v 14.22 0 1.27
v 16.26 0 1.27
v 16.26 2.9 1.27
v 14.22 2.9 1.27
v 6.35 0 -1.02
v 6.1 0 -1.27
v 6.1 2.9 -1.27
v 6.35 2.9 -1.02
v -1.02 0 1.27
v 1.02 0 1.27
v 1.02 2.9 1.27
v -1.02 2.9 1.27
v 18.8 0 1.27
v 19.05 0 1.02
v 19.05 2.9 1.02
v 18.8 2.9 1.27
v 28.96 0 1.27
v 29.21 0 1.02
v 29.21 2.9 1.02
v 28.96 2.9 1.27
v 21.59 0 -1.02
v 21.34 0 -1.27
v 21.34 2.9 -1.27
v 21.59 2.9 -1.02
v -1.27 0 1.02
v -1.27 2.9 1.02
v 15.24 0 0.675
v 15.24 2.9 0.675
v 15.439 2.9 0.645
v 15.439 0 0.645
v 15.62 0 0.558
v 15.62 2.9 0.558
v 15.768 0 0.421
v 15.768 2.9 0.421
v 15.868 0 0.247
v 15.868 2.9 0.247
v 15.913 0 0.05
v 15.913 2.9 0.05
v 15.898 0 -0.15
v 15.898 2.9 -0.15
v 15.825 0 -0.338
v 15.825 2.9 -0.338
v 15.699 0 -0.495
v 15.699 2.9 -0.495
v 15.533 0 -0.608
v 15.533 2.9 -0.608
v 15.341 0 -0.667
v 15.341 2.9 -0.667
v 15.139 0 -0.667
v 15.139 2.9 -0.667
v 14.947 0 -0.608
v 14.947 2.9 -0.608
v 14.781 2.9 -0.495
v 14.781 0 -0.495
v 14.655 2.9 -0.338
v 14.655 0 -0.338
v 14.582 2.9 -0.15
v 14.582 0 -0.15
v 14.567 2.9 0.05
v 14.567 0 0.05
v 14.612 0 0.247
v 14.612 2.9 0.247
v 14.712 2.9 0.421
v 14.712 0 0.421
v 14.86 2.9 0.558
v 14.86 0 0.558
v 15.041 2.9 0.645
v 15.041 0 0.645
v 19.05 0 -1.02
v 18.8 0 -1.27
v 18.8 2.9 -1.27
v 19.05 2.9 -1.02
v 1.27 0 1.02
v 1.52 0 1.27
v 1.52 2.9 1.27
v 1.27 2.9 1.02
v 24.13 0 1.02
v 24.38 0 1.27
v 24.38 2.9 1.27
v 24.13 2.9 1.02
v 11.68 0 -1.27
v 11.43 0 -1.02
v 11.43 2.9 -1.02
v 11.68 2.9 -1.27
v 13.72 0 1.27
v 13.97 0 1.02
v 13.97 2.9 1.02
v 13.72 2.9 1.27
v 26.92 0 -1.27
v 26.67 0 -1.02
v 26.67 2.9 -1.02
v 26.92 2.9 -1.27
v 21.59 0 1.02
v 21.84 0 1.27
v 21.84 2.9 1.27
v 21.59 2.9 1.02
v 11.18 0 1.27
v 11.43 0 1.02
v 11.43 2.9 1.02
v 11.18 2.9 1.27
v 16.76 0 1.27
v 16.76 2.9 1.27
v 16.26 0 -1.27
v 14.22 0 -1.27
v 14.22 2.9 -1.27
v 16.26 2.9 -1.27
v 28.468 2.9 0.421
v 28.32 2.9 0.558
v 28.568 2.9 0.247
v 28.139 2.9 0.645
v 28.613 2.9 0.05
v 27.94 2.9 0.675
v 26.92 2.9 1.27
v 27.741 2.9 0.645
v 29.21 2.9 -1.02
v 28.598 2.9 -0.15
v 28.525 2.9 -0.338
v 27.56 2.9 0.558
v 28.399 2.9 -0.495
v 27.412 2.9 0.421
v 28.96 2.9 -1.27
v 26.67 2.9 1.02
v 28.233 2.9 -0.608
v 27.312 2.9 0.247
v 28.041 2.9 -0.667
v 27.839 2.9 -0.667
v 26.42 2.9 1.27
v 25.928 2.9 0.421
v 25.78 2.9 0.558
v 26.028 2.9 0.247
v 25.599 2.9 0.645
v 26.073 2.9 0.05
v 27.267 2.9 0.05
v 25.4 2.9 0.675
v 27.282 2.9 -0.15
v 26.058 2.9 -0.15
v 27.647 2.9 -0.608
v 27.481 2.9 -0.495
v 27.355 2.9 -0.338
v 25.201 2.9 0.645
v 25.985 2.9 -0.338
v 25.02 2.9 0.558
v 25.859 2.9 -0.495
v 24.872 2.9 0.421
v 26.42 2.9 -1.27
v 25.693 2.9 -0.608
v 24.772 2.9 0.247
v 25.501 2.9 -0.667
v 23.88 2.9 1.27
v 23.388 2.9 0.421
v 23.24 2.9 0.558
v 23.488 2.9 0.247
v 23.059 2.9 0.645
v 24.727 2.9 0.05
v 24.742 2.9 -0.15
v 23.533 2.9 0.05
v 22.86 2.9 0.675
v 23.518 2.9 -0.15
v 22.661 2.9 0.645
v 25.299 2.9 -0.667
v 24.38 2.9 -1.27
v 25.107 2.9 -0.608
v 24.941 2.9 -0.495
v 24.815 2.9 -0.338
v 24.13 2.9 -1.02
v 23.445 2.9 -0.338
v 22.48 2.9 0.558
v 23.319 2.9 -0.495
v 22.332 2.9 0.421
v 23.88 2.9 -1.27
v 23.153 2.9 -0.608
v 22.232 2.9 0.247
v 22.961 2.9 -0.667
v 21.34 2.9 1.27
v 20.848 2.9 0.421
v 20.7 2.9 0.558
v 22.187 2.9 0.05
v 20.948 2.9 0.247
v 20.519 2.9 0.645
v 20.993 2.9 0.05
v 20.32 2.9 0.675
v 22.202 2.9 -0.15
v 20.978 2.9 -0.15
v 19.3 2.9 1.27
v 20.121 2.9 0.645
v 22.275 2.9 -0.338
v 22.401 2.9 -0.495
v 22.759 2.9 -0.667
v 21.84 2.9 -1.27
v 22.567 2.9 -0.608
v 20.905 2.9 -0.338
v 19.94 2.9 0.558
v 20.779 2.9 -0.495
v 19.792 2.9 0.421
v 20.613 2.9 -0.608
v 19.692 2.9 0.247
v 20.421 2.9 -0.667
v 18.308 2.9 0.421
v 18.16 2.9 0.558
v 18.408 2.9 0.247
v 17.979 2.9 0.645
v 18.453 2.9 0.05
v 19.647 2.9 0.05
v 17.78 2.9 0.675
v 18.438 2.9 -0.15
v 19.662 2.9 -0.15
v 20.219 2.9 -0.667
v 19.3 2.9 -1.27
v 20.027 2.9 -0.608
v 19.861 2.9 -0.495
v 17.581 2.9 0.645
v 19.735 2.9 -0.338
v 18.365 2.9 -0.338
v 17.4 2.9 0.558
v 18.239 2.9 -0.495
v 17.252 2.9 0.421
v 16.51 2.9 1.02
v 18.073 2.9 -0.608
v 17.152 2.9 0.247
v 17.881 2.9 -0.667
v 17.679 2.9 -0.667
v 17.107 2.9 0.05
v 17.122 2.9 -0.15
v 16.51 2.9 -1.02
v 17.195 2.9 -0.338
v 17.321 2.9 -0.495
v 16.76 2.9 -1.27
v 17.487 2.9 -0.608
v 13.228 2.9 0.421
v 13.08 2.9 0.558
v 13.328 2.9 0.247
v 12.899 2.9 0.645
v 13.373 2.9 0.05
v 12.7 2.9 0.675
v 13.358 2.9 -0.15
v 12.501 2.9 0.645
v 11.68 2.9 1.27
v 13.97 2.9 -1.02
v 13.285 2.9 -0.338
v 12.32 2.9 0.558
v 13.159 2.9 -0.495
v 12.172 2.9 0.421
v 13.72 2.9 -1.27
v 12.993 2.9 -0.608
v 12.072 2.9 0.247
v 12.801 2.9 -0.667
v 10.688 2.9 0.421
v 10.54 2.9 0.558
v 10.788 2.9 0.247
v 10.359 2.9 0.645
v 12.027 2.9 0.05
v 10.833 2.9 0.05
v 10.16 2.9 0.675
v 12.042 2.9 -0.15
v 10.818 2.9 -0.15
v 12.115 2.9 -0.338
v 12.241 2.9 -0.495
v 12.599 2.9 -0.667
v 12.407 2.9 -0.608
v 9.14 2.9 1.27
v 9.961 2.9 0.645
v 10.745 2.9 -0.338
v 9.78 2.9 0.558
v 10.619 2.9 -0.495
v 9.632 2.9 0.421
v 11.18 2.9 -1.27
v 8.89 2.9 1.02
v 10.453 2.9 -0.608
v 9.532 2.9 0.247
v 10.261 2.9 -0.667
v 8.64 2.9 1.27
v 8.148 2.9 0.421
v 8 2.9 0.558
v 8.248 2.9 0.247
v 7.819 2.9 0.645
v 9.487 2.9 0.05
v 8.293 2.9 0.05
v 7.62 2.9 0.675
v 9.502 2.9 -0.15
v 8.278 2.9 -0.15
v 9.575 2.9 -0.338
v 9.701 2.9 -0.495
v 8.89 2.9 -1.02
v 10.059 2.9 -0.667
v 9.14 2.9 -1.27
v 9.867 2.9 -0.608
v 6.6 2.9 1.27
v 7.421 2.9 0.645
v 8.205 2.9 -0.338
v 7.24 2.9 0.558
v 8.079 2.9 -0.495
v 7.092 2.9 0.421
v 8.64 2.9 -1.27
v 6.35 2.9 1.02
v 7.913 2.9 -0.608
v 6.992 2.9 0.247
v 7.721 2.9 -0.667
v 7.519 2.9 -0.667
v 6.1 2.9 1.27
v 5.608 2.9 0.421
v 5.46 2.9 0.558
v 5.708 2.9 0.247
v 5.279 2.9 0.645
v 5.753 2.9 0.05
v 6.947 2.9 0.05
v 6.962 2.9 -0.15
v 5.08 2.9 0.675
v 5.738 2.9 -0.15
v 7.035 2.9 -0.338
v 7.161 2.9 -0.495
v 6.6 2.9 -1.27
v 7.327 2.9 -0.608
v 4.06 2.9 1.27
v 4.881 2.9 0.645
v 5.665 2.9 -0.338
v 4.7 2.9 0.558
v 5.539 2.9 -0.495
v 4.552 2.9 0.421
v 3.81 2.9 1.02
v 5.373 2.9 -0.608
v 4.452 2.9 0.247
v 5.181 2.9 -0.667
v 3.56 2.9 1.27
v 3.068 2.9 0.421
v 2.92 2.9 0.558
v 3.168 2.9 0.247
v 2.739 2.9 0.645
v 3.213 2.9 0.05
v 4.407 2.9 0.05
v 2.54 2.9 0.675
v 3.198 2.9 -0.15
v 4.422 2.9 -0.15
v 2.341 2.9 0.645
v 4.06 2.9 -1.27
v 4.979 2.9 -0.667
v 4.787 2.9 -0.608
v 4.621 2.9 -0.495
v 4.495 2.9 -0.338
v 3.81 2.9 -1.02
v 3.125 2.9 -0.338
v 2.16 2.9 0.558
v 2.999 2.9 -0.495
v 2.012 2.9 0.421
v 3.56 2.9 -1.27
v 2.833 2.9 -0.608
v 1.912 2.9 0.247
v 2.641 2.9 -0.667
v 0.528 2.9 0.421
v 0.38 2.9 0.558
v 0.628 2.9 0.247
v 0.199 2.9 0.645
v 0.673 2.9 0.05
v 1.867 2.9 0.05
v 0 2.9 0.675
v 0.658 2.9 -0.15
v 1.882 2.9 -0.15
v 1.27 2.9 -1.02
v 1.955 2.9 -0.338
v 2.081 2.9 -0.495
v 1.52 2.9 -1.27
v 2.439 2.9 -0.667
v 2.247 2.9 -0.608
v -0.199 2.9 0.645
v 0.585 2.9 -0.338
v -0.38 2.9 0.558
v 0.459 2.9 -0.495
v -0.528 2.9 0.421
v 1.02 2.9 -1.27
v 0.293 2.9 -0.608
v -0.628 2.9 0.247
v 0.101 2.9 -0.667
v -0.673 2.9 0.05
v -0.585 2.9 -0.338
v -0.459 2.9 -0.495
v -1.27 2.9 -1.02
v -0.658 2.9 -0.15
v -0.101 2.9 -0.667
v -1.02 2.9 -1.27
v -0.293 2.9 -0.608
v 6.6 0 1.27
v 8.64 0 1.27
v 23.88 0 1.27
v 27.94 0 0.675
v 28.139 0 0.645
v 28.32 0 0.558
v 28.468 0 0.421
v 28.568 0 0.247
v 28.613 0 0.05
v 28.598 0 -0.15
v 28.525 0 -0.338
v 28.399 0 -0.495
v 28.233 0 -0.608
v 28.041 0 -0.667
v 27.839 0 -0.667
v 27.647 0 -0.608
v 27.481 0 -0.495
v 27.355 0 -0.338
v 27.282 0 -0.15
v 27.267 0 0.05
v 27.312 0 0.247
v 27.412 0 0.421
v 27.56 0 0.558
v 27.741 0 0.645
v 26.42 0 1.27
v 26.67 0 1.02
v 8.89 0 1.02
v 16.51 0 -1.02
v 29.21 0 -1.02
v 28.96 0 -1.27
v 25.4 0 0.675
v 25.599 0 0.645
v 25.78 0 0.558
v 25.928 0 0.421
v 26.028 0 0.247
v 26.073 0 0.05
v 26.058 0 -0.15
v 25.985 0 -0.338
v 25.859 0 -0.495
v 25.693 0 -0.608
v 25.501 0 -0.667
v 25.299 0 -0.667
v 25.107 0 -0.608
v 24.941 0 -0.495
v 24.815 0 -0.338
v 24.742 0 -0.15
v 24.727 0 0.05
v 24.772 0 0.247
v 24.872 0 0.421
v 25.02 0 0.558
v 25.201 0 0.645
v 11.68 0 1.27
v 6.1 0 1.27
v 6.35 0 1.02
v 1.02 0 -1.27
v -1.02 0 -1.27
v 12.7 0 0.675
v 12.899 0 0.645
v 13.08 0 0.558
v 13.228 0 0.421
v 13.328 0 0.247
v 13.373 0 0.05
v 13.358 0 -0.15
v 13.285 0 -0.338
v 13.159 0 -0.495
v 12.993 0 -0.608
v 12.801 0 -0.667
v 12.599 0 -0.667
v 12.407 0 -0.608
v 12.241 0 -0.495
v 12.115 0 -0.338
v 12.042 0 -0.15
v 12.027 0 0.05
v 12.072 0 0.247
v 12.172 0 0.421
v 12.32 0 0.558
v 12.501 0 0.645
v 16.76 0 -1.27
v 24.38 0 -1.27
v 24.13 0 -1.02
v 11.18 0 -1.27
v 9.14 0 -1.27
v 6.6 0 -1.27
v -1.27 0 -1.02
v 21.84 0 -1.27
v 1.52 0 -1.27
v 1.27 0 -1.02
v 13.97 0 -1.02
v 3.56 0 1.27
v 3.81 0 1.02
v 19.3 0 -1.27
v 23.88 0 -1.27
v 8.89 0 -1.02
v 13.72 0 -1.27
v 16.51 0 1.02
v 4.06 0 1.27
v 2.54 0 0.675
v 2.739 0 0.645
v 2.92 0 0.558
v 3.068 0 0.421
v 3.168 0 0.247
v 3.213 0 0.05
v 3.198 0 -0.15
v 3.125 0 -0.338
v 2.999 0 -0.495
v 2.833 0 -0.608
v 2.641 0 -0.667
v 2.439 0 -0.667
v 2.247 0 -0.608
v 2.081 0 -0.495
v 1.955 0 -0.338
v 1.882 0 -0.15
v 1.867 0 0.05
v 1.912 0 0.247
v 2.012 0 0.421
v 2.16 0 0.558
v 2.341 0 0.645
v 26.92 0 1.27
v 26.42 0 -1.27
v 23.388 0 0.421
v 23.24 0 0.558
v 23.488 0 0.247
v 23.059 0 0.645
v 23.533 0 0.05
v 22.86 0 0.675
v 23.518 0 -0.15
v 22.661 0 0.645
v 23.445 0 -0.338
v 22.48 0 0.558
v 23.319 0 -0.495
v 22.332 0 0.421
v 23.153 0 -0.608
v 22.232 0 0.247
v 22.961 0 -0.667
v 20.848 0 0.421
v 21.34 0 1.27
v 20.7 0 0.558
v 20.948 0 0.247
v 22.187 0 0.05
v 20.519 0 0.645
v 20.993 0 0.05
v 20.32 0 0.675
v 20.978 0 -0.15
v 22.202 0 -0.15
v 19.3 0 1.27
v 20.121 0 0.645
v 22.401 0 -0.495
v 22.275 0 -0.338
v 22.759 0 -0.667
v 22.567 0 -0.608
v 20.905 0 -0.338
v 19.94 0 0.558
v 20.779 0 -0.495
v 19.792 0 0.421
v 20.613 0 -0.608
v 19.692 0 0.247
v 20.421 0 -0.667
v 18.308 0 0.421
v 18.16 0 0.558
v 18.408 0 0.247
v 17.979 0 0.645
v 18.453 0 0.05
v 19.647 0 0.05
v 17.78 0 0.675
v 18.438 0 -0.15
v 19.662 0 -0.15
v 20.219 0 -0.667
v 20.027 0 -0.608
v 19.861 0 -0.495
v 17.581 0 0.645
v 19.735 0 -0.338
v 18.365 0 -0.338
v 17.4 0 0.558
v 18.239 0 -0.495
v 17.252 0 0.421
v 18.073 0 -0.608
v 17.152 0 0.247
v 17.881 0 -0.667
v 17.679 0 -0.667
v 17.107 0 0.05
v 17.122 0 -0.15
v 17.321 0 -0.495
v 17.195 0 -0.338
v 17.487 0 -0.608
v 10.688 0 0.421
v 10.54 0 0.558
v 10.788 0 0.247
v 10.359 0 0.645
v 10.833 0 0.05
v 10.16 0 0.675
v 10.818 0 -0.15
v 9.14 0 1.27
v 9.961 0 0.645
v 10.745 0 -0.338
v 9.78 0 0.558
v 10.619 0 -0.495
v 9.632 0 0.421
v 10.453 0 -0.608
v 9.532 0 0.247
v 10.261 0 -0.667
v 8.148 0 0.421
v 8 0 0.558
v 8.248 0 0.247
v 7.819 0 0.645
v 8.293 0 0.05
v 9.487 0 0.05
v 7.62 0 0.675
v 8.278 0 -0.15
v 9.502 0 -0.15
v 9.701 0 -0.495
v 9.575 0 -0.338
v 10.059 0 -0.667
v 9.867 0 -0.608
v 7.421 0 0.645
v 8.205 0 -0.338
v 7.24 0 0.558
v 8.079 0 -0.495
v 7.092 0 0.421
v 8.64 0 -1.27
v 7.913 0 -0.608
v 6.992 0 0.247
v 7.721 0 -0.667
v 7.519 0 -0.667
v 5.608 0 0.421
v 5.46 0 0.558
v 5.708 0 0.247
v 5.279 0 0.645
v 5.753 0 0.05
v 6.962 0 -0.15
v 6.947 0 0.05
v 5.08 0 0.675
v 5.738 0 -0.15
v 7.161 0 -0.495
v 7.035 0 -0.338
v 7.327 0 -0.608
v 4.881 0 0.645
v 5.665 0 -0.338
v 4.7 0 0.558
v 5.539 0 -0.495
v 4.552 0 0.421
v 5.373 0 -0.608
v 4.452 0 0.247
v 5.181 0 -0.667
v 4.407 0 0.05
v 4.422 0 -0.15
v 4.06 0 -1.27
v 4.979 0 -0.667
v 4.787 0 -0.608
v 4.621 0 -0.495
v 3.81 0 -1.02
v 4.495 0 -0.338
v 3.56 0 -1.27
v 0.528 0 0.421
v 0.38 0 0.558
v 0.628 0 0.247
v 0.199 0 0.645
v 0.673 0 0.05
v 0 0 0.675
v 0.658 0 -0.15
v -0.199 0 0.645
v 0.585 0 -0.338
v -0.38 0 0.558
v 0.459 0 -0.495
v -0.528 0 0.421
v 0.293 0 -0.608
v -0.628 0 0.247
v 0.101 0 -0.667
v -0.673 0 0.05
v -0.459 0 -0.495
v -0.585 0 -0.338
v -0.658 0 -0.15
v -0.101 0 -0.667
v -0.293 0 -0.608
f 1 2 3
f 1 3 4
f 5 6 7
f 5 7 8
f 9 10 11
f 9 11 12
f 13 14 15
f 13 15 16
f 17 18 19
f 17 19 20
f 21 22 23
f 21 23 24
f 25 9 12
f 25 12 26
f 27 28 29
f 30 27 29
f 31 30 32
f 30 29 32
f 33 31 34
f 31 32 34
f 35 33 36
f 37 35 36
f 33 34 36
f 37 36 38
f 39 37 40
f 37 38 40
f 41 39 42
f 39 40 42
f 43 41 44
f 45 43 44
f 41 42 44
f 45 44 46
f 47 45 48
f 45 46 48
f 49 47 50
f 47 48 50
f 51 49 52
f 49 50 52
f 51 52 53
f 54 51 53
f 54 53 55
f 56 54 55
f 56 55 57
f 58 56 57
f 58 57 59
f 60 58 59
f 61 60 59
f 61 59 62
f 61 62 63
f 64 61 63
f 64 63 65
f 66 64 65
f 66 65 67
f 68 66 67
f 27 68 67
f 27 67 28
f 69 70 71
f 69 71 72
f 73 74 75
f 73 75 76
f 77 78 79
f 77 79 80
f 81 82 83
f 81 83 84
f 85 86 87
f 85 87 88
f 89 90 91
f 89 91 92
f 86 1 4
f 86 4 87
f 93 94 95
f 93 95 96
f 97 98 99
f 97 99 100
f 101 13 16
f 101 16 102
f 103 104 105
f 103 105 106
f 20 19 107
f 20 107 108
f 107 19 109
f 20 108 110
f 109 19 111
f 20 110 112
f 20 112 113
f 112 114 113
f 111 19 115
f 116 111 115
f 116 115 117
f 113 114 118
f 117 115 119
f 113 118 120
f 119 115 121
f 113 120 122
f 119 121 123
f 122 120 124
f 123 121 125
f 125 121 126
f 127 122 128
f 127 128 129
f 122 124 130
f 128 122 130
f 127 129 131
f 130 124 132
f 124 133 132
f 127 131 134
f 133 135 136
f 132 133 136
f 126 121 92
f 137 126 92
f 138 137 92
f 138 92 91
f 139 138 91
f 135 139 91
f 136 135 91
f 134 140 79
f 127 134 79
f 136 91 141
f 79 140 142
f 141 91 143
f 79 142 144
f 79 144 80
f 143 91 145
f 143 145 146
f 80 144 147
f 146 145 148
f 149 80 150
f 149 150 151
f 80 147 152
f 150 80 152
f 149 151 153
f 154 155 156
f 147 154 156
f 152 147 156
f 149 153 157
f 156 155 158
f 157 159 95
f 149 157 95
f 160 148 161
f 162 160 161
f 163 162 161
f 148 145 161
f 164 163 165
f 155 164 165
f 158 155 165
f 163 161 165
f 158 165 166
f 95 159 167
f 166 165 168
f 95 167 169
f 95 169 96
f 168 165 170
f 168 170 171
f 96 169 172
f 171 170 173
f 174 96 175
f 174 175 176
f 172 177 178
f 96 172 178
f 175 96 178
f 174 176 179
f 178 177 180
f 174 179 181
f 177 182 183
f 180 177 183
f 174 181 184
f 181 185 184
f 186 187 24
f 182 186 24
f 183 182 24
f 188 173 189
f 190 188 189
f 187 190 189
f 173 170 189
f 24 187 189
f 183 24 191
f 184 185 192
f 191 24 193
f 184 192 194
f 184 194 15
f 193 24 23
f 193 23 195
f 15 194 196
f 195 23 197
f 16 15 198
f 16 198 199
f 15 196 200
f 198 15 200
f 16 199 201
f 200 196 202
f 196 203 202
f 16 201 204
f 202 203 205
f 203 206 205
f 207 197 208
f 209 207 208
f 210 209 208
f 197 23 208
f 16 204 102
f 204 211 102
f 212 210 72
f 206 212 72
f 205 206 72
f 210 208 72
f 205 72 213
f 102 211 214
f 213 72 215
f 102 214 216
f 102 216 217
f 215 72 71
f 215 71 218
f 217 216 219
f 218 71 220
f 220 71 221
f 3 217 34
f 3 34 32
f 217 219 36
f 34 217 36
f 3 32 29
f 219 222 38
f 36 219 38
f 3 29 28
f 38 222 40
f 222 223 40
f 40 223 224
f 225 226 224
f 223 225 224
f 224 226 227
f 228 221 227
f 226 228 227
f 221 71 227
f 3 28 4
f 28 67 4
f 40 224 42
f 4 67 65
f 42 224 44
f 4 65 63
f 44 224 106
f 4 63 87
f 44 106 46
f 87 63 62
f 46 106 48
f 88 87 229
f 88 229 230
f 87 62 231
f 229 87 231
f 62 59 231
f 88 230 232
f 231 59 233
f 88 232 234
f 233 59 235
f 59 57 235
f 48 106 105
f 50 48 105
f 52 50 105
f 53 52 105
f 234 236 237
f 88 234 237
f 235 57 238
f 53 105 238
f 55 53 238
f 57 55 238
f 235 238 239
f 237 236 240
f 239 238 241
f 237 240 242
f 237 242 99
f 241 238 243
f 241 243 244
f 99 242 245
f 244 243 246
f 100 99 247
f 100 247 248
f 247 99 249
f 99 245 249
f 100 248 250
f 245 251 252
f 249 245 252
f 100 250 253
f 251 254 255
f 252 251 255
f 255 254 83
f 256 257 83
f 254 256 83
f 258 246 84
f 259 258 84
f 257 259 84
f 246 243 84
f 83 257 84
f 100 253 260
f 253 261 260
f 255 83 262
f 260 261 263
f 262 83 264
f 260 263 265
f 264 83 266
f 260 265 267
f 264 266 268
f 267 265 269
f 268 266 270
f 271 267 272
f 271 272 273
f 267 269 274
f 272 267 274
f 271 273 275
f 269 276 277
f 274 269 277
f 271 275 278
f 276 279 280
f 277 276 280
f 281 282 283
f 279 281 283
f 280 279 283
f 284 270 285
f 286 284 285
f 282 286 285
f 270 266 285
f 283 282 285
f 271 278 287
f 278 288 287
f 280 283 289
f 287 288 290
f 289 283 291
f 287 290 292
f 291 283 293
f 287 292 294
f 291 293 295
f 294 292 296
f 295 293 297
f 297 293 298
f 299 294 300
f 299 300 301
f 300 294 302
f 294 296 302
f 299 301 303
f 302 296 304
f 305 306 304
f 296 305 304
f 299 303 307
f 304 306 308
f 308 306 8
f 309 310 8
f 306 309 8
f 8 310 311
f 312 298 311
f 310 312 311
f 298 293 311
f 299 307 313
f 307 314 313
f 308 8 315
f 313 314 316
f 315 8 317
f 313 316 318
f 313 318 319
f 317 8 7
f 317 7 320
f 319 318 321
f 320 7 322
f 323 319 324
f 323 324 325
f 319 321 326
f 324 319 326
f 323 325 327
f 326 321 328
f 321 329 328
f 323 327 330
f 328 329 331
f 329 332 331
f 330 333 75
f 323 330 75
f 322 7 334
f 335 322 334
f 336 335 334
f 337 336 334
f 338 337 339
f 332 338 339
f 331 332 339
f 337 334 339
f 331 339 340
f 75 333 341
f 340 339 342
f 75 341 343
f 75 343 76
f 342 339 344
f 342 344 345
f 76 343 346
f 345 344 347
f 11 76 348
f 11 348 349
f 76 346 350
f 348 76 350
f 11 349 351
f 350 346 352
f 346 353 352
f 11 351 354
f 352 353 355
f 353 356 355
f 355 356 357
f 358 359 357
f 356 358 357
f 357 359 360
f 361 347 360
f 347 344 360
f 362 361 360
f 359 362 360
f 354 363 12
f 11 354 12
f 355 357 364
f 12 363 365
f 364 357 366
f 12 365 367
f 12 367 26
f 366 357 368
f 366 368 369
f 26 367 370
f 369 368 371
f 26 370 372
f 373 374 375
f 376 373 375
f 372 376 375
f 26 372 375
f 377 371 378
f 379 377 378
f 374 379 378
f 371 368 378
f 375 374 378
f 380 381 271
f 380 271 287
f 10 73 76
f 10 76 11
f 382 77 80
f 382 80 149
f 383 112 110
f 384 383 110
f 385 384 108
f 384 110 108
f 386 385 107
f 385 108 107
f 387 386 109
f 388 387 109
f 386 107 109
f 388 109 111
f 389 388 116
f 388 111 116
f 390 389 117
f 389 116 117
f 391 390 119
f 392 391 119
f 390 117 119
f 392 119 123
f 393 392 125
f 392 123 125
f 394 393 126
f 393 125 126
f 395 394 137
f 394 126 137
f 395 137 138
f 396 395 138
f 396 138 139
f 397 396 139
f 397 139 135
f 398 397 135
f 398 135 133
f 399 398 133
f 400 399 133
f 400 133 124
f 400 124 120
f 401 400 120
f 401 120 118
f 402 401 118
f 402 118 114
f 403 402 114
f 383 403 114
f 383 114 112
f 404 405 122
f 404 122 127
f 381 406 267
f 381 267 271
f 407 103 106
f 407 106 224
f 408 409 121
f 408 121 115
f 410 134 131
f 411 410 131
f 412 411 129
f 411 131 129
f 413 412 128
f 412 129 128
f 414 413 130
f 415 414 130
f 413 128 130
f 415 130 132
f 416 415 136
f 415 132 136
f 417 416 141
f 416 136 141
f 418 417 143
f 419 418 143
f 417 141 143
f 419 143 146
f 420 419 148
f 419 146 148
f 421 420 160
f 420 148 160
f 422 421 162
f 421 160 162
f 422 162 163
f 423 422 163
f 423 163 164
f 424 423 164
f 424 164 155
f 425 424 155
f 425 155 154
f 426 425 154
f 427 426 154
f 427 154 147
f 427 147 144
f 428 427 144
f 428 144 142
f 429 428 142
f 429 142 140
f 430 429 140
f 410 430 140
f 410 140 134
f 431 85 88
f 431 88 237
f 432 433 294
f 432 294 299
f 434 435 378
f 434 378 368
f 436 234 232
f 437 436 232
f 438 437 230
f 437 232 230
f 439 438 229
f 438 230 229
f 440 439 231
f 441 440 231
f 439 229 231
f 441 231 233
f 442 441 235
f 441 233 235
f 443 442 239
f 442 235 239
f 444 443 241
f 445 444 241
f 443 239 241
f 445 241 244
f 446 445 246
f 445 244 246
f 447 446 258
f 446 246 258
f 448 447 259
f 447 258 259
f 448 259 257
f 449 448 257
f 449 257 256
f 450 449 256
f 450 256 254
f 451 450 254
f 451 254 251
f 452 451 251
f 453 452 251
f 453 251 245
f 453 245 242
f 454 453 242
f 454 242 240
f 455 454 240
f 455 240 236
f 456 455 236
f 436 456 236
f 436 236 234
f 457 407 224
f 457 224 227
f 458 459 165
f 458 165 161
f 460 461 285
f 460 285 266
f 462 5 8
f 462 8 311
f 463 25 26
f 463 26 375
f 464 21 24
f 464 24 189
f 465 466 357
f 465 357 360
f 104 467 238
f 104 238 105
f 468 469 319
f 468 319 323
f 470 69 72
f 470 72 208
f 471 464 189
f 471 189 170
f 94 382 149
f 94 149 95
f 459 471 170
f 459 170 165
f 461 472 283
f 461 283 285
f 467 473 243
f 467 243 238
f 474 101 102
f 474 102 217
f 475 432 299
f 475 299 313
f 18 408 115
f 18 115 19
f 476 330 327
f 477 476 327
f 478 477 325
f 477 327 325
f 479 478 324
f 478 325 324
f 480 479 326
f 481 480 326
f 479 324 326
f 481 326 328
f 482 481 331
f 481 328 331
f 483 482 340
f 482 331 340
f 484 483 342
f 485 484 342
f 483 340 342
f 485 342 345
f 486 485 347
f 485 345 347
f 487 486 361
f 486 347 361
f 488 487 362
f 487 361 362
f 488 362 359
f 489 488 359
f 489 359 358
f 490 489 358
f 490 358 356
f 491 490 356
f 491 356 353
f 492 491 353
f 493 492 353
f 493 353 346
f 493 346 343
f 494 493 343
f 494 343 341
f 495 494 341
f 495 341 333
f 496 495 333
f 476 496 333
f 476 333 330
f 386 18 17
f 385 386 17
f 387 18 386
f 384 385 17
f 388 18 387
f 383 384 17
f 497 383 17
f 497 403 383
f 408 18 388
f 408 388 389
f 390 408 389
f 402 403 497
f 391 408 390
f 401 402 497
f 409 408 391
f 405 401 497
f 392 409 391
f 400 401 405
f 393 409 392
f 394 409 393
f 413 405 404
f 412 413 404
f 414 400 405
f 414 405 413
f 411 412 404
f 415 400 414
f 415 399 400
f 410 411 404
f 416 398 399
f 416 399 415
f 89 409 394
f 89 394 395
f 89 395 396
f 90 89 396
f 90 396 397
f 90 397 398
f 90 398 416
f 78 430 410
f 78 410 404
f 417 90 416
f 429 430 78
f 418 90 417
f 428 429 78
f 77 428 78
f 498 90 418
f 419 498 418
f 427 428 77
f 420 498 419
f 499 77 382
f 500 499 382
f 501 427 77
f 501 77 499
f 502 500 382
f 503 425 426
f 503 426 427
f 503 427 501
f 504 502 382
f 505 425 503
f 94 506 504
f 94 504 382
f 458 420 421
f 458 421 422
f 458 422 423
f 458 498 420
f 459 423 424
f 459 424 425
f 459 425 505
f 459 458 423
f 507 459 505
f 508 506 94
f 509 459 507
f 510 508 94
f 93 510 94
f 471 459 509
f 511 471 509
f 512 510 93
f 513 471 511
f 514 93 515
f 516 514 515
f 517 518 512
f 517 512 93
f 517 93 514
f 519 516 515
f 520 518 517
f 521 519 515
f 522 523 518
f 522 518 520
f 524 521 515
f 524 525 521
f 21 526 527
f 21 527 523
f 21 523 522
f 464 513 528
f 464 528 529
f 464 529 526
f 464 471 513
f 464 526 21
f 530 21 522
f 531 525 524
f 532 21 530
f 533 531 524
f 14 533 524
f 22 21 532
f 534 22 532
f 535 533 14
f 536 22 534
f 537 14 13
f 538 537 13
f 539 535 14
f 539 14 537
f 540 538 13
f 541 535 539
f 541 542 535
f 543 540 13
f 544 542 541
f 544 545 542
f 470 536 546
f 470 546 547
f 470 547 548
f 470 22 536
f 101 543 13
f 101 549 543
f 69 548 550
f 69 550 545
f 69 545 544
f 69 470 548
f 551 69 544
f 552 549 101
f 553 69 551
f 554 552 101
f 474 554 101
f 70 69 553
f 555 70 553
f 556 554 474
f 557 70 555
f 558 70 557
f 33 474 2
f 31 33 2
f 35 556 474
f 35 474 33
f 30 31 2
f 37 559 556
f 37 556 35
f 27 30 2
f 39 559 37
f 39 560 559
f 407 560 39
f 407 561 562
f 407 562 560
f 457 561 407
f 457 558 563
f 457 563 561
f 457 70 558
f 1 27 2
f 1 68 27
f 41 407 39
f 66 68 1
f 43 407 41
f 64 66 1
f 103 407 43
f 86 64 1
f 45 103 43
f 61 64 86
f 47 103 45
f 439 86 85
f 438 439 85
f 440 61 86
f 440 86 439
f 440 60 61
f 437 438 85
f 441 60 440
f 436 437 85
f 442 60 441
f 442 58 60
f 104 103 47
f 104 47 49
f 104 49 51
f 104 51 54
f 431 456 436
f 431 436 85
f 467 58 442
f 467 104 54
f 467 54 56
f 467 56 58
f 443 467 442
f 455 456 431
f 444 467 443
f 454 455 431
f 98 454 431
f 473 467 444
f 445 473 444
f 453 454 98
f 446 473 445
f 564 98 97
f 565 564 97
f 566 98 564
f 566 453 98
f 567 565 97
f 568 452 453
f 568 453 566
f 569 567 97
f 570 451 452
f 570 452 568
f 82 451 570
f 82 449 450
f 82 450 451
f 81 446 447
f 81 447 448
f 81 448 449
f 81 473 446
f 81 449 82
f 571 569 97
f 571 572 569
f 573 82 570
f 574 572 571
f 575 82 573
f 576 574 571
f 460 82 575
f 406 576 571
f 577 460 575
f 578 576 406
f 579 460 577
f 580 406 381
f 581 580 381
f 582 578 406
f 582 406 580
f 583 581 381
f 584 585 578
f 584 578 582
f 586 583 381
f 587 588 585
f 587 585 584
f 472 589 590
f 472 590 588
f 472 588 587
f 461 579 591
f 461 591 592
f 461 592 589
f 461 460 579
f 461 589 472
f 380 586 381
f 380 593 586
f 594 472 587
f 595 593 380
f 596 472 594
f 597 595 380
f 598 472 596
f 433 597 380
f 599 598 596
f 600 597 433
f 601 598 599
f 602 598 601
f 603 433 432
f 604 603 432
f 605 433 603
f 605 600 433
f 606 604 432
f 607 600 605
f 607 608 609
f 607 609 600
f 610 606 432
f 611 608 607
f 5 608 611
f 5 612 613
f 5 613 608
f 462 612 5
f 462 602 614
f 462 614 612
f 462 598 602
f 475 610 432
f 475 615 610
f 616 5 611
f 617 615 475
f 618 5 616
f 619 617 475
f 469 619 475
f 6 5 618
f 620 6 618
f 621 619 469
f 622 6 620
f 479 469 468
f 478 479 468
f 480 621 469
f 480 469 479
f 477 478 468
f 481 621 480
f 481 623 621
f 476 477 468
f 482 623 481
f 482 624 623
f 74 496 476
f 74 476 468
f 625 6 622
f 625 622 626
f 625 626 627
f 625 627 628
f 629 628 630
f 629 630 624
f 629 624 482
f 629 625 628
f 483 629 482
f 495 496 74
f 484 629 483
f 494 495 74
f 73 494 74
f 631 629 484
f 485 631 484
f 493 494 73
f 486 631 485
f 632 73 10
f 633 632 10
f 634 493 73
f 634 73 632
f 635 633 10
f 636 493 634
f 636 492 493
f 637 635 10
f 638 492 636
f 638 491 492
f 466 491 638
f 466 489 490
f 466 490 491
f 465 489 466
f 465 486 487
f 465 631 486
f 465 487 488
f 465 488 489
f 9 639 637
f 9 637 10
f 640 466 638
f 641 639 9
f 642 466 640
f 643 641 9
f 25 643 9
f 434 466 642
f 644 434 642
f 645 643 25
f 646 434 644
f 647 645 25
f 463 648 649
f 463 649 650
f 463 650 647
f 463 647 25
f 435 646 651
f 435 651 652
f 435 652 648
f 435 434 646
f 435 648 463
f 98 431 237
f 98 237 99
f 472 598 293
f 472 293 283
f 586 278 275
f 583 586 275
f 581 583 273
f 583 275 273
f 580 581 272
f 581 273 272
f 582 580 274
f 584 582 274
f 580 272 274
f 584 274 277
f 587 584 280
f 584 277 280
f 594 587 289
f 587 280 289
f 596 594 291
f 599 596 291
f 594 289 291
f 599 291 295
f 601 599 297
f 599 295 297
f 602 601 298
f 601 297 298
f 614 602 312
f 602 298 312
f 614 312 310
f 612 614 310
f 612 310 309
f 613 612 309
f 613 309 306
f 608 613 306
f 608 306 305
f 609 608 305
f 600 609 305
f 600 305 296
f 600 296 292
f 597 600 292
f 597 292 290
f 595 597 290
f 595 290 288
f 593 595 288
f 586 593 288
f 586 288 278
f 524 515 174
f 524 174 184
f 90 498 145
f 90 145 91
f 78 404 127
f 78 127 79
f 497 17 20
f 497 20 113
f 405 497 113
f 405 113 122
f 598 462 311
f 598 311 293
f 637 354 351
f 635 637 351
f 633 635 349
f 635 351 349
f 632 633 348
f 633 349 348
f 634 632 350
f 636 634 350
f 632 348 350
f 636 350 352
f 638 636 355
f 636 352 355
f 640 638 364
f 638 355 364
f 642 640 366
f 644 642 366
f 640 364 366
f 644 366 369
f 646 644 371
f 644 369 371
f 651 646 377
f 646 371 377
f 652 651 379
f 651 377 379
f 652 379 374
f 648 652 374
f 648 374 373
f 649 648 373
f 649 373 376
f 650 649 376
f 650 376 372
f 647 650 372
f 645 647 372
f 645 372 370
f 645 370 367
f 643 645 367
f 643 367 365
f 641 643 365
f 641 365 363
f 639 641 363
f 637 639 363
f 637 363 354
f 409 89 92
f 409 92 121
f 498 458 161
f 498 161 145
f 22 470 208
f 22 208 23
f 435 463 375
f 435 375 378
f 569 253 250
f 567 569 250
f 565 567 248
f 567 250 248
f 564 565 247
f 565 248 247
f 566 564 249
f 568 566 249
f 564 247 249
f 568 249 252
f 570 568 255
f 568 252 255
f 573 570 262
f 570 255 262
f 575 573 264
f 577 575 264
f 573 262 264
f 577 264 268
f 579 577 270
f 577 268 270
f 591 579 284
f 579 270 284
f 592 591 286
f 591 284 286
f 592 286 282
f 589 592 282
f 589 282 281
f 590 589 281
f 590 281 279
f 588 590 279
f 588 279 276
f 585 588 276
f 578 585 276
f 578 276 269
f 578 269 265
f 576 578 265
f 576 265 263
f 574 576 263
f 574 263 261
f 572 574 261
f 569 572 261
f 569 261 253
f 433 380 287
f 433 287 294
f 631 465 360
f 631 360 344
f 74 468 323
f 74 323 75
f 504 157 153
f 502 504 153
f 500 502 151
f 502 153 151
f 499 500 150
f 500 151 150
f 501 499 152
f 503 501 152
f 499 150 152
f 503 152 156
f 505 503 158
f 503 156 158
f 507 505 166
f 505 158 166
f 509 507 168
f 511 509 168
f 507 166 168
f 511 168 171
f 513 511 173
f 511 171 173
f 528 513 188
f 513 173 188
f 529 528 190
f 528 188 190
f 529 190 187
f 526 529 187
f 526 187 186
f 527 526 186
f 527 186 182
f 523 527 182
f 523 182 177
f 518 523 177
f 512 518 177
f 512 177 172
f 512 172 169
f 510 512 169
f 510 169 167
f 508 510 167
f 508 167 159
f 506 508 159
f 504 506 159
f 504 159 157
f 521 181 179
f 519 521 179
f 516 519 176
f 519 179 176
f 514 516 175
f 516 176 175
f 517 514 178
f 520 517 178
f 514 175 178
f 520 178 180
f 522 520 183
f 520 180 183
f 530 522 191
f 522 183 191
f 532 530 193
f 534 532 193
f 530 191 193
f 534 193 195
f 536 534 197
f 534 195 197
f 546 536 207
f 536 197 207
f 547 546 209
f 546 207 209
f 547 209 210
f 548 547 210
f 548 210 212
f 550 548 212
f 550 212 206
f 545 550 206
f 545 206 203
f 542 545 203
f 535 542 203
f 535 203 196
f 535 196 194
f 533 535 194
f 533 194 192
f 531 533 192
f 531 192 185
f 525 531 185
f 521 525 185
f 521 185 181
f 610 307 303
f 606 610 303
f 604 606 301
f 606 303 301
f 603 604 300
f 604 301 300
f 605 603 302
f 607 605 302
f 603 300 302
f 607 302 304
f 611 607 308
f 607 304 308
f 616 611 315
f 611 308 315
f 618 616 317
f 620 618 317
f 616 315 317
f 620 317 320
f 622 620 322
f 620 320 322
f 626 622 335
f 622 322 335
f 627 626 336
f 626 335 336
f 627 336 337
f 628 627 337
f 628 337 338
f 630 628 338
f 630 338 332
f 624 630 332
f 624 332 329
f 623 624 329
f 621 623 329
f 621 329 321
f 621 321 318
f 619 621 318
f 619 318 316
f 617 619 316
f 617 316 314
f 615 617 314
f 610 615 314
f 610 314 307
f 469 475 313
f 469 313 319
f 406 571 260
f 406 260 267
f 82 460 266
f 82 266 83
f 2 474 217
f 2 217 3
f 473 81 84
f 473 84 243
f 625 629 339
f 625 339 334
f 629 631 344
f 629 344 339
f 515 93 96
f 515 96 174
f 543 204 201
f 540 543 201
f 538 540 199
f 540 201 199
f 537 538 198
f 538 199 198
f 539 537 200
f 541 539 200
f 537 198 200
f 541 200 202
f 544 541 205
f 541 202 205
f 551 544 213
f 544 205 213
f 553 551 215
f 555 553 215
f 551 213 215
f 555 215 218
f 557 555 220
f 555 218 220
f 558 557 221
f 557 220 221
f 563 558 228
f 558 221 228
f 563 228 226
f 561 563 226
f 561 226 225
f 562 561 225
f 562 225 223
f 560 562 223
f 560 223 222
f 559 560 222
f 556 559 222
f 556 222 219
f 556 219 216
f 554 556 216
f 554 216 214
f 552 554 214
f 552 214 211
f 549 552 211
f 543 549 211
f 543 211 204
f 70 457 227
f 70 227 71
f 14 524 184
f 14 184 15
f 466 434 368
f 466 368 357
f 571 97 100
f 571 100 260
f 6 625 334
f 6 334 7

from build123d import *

# Parameters (mm, degrees)
BOSS_EXTRUDE1_DEPTH = 2.9
SKETCH3_R           = 0.675
CUT_EXTRUDE1_DEPTH  = 3
LPATTERN1_COUNT     = 12
LPATTERN1_PITCH     = 2.54


with BuildPart() as part:
    # Sketch2 → Boss-Extrude1 (new body)
    with BuildSketch(Plane(origin=(0, 0, 0), x_dir=(1, 0, 0), z_dir=(0, 1, 0))):
        Polygon((-1.02, 1.27), (1.02, 1.27), (1.27, 1.02), (1.27, -1.02), (1.02, -1.27), (-1.02, -1.27), (-1.27, -1.02), (-1.27, 1.02), align=None)
    boss_extrude1 = extrude(amount=BOSS_EXTRUDE1_DEPTH)

    # Sketch3 → Cut-Extrude1 (cut)
    with BuildSketch(Plane(origin=(0, 2.9, 0), x_dir=(1, 0, 0), z_dir=(0, 1, 0))):
        with Locations(Location((0, 0, 0), (0, 0, 270))):
            Circle(SKETCH3_R)
    cut_extrude1 = extrude(amount=-CUT_EXTRUDE1_DEPTH, mode=Mode.SUBTRACT)

    # LPattern1: Boss-Extrude1, Cut-Extrude1 ×12
    with Locations(*[(i * LPATTERN1_PITCH, 0, 0) for i in range(1, LPATTERN1_COUNT)]):
        add(boss_extrude1)
        add(cut_extrude1, mode=Mode.SUBTRACT)


solid = part.part
